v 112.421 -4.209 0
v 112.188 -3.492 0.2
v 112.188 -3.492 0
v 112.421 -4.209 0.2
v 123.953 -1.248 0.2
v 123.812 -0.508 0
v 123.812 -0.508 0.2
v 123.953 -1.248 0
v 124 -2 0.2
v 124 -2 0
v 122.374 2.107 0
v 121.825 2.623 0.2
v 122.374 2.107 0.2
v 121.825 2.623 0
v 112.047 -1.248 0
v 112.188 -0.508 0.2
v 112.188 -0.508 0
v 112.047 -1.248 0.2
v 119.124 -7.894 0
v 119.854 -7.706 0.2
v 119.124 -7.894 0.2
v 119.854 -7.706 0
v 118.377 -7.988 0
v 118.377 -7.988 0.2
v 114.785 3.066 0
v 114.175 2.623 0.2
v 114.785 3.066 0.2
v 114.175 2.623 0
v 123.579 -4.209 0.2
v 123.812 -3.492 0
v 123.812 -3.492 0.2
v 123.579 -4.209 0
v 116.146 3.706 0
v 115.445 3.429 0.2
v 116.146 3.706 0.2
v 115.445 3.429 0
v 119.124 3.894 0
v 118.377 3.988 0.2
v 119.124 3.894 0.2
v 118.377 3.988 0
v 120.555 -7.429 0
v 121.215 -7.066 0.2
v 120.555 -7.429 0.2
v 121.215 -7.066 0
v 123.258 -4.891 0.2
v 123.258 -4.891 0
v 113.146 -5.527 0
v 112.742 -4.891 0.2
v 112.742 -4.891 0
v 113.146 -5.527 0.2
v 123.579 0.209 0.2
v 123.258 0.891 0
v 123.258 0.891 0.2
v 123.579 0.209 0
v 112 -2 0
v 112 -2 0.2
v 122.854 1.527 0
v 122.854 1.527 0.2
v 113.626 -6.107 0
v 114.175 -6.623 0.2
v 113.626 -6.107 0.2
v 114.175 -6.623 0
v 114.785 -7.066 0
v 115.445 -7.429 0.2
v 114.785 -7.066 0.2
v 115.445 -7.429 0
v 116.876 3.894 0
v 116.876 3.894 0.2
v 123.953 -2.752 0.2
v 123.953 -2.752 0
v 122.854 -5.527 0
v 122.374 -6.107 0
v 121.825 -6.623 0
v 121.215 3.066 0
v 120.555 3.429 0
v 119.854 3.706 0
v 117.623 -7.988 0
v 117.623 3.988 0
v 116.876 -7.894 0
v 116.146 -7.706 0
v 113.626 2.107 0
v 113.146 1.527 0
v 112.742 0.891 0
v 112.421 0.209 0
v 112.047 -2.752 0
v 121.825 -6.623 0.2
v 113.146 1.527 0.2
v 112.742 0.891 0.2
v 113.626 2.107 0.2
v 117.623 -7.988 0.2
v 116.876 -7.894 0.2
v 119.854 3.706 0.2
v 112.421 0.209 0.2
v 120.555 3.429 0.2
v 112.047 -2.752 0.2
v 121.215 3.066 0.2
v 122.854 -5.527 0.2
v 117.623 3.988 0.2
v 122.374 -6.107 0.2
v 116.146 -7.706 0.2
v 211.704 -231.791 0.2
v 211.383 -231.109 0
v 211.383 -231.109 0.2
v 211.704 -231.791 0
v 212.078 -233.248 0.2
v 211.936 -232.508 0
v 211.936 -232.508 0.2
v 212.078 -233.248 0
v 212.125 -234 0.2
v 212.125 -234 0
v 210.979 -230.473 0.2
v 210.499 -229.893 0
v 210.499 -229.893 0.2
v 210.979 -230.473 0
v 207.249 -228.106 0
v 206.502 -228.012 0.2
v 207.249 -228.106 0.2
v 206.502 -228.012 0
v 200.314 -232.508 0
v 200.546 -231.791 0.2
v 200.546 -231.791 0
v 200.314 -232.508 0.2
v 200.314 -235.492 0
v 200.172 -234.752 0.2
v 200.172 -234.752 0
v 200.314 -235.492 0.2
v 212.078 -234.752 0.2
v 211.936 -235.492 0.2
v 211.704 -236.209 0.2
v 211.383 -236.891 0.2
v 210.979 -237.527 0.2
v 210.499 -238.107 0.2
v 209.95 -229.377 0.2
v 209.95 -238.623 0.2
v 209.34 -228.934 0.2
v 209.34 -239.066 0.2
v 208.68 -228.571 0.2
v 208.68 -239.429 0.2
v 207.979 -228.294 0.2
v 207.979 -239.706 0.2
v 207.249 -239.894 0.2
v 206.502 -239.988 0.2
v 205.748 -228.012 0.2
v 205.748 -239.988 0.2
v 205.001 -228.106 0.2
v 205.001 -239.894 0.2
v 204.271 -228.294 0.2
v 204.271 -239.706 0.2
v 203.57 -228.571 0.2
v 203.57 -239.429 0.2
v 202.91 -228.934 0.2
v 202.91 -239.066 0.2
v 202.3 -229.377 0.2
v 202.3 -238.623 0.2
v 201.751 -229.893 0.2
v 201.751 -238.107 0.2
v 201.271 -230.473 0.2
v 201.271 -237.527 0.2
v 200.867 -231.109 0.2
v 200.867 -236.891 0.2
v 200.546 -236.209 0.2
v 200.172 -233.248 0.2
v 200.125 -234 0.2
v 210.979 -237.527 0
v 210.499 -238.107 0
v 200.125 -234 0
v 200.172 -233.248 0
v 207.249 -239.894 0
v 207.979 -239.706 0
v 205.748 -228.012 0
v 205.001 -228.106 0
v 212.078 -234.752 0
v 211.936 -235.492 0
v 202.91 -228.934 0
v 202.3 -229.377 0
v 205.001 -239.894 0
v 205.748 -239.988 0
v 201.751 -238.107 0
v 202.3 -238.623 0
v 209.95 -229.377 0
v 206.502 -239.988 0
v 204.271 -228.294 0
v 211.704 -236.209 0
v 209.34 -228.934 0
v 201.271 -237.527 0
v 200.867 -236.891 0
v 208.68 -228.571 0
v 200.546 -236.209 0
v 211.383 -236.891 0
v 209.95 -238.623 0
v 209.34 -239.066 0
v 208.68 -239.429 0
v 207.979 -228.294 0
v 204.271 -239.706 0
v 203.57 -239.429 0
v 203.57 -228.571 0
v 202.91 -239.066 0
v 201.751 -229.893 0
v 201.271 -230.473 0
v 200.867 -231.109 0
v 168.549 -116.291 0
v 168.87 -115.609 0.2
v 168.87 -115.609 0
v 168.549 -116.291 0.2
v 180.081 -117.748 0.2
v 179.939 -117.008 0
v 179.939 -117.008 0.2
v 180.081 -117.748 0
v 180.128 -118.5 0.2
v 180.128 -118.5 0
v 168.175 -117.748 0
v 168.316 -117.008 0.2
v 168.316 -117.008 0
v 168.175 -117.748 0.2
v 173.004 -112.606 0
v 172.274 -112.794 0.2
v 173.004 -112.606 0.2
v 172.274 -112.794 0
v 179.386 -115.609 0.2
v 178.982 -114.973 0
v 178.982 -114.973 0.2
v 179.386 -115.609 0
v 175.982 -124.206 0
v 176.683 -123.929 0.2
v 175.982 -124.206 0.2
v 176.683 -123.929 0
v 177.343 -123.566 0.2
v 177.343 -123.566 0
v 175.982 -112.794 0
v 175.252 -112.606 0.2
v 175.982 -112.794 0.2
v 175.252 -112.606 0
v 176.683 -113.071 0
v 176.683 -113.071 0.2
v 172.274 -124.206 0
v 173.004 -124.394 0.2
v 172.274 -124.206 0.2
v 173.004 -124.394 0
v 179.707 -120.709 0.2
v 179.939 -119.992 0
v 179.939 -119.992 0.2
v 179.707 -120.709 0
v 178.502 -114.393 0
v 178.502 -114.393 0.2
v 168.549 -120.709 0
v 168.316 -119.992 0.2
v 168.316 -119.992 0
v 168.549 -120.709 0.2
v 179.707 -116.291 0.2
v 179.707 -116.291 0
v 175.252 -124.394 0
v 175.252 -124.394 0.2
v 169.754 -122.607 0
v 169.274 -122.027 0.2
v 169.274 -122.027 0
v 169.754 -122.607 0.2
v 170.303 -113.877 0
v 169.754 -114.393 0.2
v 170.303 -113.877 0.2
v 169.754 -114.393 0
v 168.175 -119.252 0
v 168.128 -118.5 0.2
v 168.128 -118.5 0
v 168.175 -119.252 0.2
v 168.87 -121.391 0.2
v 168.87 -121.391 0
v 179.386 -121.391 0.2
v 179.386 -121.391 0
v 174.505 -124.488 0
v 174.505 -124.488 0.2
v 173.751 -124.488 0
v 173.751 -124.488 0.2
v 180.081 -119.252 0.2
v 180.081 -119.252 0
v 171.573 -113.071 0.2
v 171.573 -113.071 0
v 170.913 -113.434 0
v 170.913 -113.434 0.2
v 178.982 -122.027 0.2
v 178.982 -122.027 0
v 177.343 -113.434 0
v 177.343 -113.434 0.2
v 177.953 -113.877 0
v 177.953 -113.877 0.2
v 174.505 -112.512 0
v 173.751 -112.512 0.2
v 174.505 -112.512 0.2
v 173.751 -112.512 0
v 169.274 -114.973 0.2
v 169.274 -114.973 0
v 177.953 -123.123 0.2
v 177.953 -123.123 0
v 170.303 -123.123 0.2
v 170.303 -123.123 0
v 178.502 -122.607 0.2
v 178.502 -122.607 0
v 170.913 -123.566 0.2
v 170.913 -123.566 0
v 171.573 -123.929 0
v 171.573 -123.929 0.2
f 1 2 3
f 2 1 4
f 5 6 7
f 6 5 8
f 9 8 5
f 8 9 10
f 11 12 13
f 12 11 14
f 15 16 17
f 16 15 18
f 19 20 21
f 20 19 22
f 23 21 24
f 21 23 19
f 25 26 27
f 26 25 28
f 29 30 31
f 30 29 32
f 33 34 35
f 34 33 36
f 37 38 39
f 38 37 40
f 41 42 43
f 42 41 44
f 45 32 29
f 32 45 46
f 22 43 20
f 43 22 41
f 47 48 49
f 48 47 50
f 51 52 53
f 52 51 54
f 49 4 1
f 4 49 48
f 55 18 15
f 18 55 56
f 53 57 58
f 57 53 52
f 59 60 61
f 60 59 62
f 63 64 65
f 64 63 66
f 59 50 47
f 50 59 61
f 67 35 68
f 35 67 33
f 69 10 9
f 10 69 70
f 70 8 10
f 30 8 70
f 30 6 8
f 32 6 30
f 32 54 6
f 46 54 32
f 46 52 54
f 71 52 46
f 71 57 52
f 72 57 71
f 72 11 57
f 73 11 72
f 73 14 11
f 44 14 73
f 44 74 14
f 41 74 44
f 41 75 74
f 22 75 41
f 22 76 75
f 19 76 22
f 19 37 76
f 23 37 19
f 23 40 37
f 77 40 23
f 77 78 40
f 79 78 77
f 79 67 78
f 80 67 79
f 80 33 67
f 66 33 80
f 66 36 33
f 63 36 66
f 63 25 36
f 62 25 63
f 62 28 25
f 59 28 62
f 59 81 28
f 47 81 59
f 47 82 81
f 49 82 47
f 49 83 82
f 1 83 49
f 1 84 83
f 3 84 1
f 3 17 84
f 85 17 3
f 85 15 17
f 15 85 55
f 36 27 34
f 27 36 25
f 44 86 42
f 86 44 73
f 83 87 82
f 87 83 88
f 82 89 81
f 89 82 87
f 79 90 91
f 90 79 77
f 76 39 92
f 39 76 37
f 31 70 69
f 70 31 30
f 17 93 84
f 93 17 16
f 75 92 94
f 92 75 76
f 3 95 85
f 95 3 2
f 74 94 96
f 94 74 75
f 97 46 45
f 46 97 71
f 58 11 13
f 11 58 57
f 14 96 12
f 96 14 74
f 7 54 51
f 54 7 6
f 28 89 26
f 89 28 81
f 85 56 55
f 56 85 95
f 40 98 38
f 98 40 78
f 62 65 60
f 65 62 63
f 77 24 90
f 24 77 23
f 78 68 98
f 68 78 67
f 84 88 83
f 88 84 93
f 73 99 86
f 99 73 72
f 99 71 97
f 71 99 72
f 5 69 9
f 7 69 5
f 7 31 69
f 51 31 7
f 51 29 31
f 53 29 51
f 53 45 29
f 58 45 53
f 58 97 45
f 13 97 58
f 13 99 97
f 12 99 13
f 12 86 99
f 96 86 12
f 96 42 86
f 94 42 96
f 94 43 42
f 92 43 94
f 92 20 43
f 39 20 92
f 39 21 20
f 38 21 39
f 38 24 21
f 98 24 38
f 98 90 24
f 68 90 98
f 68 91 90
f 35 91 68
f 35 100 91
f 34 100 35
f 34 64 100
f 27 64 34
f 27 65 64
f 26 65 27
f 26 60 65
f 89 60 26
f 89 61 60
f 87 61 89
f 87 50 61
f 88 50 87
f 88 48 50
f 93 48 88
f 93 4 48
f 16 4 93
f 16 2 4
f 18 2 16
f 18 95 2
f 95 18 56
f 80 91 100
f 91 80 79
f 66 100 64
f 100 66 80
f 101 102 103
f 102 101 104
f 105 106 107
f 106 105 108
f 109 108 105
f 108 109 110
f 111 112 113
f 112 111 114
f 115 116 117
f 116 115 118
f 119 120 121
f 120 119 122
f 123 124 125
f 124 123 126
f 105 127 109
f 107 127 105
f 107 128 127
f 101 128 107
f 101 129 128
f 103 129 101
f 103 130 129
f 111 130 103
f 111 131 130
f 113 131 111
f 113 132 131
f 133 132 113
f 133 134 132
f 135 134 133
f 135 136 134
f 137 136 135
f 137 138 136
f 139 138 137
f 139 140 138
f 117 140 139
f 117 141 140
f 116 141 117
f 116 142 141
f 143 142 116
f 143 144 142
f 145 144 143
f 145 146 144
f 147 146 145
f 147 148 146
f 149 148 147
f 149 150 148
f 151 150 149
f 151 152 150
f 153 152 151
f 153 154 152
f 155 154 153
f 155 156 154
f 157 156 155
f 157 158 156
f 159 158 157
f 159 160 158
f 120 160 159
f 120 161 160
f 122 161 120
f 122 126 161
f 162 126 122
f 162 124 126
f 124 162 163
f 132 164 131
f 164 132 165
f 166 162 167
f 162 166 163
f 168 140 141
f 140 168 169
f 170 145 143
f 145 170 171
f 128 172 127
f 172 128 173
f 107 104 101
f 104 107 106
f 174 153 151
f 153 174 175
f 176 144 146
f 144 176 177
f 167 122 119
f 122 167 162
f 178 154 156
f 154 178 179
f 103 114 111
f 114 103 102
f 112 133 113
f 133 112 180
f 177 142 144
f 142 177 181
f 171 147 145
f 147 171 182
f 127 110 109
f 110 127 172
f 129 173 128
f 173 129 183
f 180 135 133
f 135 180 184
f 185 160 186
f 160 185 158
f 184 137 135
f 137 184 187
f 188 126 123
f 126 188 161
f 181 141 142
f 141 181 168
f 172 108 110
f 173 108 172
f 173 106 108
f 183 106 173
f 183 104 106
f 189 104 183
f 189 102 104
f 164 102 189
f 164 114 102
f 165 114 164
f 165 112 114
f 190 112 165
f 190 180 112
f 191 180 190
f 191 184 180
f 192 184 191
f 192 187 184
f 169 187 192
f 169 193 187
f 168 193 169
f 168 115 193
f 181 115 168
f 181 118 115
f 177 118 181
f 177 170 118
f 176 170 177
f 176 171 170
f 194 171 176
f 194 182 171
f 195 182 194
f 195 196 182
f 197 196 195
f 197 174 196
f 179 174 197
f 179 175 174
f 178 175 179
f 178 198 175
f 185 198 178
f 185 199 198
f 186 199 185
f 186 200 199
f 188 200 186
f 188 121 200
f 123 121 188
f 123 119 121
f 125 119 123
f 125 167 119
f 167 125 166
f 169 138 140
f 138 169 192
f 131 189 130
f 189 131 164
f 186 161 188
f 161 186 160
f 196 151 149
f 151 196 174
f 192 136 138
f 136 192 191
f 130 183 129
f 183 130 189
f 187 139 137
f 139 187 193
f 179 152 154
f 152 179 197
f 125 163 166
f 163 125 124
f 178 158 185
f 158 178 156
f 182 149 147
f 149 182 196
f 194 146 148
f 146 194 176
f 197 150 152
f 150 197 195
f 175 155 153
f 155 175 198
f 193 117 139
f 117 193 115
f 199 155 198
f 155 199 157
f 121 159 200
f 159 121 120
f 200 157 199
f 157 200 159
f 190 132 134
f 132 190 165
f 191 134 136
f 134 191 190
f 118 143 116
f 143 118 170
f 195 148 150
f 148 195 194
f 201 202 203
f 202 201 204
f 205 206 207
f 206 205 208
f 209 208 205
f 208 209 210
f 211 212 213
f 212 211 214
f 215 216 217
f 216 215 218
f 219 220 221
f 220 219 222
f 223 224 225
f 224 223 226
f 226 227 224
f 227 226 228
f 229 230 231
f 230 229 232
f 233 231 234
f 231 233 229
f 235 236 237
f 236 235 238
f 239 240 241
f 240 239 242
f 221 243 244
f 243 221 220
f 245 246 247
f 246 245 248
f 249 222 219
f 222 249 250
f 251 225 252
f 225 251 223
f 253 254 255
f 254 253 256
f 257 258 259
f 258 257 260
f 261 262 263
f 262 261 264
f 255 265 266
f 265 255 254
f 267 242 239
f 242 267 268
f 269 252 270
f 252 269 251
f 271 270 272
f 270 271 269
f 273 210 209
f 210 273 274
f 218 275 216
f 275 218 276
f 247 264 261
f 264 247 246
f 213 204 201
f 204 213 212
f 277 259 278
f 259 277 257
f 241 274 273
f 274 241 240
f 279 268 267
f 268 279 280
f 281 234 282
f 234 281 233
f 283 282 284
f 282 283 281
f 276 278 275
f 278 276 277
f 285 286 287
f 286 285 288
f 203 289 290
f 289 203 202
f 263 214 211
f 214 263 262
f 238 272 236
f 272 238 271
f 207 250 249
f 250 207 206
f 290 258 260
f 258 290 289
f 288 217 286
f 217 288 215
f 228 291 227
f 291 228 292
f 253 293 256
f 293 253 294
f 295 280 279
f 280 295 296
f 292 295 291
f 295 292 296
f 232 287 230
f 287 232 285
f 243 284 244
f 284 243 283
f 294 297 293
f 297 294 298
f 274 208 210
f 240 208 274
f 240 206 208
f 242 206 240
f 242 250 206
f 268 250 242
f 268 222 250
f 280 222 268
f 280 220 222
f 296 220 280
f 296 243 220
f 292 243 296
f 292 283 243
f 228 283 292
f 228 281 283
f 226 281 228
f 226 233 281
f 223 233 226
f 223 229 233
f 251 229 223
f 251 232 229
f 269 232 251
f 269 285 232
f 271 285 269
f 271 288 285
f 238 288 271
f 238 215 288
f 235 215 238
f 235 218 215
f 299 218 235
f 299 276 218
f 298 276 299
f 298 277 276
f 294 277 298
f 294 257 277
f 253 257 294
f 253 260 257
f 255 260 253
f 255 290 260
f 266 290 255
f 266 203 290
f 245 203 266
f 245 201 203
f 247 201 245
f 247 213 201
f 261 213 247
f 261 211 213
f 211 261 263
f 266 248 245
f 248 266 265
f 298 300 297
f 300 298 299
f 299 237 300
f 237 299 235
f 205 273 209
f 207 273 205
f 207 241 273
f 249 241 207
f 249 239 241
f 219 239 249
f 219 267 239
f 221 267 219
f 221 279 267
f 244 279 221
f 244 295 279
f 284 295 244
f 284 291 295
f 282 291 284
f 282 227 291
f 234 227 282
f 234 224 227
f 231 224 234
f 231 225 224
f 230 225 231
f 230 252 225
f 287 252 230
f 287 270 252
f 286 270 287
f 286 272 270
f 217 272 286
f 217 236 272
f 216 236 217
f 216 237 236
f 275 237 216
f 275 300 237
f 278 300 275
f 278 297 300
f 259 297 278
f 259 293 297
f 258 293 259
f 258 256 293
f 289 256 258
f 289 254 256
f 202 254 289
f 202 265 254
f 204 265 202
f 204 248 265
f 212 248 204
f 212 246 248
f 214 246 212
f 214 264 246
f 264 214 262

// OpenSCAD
union() {
  union() {
    translate([118, -2, 0]) {
      cylinder(h = 0.2, r = 6);
    }
    translate([206.125, -234, 0]) {
      cylinder(h = 0.2, r = 6);
    }
  }
  translate([174.128, -118.5, 0]) {
    cylinder(h = 0.2, r = 6);
  }
}
$fn = 50;
